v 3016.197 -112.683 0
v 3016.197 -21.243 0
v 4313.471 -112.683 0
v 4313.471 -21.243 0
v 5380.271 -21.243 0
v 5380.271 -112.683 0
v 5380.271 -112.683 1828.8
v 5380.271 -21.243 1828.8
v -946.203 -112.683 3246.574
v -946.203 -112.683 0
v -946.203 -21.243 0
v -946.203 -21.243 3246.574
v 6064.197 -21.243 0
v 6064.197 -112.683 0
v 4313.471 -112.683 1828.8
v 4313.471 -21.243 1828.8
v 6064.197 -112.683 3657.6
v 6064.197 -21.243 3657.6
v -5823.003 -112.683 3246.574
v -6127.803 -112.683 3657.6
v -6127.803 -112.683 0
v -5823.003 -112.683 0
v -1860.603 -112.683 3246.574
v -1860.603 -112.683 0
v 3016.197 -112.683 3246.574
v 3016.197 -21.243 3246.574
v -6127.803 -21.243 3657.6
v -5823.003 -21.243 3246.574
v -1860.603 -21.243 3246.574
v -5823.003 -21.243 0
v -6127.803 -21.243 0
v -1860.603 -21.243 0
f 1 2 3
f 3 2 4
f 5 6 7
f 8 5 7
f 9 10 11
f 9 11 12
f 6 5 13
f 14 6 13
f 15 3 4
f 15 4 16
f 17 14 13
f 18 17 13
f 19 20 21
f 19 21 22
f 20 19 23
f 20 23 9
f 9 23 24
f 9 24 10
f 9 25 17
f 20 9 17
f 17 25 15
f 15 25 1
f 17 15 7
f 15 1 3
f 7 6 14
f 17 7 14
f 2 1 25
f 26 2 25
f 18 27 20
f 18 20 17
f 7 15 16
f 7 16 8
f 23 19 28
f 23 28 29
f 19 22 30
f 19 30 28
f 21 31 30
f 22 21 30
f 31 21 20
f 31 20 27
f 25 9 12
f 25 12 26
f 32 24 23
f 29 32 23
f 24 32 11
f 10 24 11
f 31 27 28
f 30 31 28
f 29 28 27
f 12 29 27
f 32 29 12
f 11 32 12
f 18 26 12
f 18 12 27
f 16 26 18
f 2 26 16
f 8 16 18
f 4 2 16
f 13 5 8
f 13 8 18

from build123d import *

# Parameters (mm, degrees)
F0_W     = 12192
F0_H     = 91.44
F1_DEPTH = 3657.6
F2_W     = 3962.4
F2_H     = 3246.574109
F3_DEPTH = 1676.4
F2_W_2   = 1066.8
F2_H_2   = 1828.8
F4_DEPTH = 1862.328


with BuildPart() as f1:
    # F0 (on Top) → F1 (new body)
    with BuildSketch(Plane.XY):
        with Locations((-31.802535, -66.962735)):
            Rectangle(F0_W, F0_H)
    extrude(amount=F1_DEPTH)

    # F2 (on face) → F3 (cut)
    with BuildSketch(Plane.XZ.offset(112.682735)):
        with Locations((1034.997465, 1623.287054)):
            Rectangle(F2_W, F2_H)
    extrude(amount=-F3_DEPTH, mode=Mode.SUBTRACT)

    # F2 (on face) → F4 (cut)
    with BuildSketch(Plane.XZ.offset(112.682735)):
        with Locations((-3841.802535, 1623.287054)):
            Rectangle(F2_W, F2_H)
        with Locations((1034.997465, 1623.287054)):
            Rectangle(F2_W, F2_H)
        with Locations((4846.87084, 914.4)):
            Rectangle(F2_W_2, F2_H_2)
    extrude(amount=-F4_DEPTH, mode=Mode.SUBTRACT)


solid = f1.part
